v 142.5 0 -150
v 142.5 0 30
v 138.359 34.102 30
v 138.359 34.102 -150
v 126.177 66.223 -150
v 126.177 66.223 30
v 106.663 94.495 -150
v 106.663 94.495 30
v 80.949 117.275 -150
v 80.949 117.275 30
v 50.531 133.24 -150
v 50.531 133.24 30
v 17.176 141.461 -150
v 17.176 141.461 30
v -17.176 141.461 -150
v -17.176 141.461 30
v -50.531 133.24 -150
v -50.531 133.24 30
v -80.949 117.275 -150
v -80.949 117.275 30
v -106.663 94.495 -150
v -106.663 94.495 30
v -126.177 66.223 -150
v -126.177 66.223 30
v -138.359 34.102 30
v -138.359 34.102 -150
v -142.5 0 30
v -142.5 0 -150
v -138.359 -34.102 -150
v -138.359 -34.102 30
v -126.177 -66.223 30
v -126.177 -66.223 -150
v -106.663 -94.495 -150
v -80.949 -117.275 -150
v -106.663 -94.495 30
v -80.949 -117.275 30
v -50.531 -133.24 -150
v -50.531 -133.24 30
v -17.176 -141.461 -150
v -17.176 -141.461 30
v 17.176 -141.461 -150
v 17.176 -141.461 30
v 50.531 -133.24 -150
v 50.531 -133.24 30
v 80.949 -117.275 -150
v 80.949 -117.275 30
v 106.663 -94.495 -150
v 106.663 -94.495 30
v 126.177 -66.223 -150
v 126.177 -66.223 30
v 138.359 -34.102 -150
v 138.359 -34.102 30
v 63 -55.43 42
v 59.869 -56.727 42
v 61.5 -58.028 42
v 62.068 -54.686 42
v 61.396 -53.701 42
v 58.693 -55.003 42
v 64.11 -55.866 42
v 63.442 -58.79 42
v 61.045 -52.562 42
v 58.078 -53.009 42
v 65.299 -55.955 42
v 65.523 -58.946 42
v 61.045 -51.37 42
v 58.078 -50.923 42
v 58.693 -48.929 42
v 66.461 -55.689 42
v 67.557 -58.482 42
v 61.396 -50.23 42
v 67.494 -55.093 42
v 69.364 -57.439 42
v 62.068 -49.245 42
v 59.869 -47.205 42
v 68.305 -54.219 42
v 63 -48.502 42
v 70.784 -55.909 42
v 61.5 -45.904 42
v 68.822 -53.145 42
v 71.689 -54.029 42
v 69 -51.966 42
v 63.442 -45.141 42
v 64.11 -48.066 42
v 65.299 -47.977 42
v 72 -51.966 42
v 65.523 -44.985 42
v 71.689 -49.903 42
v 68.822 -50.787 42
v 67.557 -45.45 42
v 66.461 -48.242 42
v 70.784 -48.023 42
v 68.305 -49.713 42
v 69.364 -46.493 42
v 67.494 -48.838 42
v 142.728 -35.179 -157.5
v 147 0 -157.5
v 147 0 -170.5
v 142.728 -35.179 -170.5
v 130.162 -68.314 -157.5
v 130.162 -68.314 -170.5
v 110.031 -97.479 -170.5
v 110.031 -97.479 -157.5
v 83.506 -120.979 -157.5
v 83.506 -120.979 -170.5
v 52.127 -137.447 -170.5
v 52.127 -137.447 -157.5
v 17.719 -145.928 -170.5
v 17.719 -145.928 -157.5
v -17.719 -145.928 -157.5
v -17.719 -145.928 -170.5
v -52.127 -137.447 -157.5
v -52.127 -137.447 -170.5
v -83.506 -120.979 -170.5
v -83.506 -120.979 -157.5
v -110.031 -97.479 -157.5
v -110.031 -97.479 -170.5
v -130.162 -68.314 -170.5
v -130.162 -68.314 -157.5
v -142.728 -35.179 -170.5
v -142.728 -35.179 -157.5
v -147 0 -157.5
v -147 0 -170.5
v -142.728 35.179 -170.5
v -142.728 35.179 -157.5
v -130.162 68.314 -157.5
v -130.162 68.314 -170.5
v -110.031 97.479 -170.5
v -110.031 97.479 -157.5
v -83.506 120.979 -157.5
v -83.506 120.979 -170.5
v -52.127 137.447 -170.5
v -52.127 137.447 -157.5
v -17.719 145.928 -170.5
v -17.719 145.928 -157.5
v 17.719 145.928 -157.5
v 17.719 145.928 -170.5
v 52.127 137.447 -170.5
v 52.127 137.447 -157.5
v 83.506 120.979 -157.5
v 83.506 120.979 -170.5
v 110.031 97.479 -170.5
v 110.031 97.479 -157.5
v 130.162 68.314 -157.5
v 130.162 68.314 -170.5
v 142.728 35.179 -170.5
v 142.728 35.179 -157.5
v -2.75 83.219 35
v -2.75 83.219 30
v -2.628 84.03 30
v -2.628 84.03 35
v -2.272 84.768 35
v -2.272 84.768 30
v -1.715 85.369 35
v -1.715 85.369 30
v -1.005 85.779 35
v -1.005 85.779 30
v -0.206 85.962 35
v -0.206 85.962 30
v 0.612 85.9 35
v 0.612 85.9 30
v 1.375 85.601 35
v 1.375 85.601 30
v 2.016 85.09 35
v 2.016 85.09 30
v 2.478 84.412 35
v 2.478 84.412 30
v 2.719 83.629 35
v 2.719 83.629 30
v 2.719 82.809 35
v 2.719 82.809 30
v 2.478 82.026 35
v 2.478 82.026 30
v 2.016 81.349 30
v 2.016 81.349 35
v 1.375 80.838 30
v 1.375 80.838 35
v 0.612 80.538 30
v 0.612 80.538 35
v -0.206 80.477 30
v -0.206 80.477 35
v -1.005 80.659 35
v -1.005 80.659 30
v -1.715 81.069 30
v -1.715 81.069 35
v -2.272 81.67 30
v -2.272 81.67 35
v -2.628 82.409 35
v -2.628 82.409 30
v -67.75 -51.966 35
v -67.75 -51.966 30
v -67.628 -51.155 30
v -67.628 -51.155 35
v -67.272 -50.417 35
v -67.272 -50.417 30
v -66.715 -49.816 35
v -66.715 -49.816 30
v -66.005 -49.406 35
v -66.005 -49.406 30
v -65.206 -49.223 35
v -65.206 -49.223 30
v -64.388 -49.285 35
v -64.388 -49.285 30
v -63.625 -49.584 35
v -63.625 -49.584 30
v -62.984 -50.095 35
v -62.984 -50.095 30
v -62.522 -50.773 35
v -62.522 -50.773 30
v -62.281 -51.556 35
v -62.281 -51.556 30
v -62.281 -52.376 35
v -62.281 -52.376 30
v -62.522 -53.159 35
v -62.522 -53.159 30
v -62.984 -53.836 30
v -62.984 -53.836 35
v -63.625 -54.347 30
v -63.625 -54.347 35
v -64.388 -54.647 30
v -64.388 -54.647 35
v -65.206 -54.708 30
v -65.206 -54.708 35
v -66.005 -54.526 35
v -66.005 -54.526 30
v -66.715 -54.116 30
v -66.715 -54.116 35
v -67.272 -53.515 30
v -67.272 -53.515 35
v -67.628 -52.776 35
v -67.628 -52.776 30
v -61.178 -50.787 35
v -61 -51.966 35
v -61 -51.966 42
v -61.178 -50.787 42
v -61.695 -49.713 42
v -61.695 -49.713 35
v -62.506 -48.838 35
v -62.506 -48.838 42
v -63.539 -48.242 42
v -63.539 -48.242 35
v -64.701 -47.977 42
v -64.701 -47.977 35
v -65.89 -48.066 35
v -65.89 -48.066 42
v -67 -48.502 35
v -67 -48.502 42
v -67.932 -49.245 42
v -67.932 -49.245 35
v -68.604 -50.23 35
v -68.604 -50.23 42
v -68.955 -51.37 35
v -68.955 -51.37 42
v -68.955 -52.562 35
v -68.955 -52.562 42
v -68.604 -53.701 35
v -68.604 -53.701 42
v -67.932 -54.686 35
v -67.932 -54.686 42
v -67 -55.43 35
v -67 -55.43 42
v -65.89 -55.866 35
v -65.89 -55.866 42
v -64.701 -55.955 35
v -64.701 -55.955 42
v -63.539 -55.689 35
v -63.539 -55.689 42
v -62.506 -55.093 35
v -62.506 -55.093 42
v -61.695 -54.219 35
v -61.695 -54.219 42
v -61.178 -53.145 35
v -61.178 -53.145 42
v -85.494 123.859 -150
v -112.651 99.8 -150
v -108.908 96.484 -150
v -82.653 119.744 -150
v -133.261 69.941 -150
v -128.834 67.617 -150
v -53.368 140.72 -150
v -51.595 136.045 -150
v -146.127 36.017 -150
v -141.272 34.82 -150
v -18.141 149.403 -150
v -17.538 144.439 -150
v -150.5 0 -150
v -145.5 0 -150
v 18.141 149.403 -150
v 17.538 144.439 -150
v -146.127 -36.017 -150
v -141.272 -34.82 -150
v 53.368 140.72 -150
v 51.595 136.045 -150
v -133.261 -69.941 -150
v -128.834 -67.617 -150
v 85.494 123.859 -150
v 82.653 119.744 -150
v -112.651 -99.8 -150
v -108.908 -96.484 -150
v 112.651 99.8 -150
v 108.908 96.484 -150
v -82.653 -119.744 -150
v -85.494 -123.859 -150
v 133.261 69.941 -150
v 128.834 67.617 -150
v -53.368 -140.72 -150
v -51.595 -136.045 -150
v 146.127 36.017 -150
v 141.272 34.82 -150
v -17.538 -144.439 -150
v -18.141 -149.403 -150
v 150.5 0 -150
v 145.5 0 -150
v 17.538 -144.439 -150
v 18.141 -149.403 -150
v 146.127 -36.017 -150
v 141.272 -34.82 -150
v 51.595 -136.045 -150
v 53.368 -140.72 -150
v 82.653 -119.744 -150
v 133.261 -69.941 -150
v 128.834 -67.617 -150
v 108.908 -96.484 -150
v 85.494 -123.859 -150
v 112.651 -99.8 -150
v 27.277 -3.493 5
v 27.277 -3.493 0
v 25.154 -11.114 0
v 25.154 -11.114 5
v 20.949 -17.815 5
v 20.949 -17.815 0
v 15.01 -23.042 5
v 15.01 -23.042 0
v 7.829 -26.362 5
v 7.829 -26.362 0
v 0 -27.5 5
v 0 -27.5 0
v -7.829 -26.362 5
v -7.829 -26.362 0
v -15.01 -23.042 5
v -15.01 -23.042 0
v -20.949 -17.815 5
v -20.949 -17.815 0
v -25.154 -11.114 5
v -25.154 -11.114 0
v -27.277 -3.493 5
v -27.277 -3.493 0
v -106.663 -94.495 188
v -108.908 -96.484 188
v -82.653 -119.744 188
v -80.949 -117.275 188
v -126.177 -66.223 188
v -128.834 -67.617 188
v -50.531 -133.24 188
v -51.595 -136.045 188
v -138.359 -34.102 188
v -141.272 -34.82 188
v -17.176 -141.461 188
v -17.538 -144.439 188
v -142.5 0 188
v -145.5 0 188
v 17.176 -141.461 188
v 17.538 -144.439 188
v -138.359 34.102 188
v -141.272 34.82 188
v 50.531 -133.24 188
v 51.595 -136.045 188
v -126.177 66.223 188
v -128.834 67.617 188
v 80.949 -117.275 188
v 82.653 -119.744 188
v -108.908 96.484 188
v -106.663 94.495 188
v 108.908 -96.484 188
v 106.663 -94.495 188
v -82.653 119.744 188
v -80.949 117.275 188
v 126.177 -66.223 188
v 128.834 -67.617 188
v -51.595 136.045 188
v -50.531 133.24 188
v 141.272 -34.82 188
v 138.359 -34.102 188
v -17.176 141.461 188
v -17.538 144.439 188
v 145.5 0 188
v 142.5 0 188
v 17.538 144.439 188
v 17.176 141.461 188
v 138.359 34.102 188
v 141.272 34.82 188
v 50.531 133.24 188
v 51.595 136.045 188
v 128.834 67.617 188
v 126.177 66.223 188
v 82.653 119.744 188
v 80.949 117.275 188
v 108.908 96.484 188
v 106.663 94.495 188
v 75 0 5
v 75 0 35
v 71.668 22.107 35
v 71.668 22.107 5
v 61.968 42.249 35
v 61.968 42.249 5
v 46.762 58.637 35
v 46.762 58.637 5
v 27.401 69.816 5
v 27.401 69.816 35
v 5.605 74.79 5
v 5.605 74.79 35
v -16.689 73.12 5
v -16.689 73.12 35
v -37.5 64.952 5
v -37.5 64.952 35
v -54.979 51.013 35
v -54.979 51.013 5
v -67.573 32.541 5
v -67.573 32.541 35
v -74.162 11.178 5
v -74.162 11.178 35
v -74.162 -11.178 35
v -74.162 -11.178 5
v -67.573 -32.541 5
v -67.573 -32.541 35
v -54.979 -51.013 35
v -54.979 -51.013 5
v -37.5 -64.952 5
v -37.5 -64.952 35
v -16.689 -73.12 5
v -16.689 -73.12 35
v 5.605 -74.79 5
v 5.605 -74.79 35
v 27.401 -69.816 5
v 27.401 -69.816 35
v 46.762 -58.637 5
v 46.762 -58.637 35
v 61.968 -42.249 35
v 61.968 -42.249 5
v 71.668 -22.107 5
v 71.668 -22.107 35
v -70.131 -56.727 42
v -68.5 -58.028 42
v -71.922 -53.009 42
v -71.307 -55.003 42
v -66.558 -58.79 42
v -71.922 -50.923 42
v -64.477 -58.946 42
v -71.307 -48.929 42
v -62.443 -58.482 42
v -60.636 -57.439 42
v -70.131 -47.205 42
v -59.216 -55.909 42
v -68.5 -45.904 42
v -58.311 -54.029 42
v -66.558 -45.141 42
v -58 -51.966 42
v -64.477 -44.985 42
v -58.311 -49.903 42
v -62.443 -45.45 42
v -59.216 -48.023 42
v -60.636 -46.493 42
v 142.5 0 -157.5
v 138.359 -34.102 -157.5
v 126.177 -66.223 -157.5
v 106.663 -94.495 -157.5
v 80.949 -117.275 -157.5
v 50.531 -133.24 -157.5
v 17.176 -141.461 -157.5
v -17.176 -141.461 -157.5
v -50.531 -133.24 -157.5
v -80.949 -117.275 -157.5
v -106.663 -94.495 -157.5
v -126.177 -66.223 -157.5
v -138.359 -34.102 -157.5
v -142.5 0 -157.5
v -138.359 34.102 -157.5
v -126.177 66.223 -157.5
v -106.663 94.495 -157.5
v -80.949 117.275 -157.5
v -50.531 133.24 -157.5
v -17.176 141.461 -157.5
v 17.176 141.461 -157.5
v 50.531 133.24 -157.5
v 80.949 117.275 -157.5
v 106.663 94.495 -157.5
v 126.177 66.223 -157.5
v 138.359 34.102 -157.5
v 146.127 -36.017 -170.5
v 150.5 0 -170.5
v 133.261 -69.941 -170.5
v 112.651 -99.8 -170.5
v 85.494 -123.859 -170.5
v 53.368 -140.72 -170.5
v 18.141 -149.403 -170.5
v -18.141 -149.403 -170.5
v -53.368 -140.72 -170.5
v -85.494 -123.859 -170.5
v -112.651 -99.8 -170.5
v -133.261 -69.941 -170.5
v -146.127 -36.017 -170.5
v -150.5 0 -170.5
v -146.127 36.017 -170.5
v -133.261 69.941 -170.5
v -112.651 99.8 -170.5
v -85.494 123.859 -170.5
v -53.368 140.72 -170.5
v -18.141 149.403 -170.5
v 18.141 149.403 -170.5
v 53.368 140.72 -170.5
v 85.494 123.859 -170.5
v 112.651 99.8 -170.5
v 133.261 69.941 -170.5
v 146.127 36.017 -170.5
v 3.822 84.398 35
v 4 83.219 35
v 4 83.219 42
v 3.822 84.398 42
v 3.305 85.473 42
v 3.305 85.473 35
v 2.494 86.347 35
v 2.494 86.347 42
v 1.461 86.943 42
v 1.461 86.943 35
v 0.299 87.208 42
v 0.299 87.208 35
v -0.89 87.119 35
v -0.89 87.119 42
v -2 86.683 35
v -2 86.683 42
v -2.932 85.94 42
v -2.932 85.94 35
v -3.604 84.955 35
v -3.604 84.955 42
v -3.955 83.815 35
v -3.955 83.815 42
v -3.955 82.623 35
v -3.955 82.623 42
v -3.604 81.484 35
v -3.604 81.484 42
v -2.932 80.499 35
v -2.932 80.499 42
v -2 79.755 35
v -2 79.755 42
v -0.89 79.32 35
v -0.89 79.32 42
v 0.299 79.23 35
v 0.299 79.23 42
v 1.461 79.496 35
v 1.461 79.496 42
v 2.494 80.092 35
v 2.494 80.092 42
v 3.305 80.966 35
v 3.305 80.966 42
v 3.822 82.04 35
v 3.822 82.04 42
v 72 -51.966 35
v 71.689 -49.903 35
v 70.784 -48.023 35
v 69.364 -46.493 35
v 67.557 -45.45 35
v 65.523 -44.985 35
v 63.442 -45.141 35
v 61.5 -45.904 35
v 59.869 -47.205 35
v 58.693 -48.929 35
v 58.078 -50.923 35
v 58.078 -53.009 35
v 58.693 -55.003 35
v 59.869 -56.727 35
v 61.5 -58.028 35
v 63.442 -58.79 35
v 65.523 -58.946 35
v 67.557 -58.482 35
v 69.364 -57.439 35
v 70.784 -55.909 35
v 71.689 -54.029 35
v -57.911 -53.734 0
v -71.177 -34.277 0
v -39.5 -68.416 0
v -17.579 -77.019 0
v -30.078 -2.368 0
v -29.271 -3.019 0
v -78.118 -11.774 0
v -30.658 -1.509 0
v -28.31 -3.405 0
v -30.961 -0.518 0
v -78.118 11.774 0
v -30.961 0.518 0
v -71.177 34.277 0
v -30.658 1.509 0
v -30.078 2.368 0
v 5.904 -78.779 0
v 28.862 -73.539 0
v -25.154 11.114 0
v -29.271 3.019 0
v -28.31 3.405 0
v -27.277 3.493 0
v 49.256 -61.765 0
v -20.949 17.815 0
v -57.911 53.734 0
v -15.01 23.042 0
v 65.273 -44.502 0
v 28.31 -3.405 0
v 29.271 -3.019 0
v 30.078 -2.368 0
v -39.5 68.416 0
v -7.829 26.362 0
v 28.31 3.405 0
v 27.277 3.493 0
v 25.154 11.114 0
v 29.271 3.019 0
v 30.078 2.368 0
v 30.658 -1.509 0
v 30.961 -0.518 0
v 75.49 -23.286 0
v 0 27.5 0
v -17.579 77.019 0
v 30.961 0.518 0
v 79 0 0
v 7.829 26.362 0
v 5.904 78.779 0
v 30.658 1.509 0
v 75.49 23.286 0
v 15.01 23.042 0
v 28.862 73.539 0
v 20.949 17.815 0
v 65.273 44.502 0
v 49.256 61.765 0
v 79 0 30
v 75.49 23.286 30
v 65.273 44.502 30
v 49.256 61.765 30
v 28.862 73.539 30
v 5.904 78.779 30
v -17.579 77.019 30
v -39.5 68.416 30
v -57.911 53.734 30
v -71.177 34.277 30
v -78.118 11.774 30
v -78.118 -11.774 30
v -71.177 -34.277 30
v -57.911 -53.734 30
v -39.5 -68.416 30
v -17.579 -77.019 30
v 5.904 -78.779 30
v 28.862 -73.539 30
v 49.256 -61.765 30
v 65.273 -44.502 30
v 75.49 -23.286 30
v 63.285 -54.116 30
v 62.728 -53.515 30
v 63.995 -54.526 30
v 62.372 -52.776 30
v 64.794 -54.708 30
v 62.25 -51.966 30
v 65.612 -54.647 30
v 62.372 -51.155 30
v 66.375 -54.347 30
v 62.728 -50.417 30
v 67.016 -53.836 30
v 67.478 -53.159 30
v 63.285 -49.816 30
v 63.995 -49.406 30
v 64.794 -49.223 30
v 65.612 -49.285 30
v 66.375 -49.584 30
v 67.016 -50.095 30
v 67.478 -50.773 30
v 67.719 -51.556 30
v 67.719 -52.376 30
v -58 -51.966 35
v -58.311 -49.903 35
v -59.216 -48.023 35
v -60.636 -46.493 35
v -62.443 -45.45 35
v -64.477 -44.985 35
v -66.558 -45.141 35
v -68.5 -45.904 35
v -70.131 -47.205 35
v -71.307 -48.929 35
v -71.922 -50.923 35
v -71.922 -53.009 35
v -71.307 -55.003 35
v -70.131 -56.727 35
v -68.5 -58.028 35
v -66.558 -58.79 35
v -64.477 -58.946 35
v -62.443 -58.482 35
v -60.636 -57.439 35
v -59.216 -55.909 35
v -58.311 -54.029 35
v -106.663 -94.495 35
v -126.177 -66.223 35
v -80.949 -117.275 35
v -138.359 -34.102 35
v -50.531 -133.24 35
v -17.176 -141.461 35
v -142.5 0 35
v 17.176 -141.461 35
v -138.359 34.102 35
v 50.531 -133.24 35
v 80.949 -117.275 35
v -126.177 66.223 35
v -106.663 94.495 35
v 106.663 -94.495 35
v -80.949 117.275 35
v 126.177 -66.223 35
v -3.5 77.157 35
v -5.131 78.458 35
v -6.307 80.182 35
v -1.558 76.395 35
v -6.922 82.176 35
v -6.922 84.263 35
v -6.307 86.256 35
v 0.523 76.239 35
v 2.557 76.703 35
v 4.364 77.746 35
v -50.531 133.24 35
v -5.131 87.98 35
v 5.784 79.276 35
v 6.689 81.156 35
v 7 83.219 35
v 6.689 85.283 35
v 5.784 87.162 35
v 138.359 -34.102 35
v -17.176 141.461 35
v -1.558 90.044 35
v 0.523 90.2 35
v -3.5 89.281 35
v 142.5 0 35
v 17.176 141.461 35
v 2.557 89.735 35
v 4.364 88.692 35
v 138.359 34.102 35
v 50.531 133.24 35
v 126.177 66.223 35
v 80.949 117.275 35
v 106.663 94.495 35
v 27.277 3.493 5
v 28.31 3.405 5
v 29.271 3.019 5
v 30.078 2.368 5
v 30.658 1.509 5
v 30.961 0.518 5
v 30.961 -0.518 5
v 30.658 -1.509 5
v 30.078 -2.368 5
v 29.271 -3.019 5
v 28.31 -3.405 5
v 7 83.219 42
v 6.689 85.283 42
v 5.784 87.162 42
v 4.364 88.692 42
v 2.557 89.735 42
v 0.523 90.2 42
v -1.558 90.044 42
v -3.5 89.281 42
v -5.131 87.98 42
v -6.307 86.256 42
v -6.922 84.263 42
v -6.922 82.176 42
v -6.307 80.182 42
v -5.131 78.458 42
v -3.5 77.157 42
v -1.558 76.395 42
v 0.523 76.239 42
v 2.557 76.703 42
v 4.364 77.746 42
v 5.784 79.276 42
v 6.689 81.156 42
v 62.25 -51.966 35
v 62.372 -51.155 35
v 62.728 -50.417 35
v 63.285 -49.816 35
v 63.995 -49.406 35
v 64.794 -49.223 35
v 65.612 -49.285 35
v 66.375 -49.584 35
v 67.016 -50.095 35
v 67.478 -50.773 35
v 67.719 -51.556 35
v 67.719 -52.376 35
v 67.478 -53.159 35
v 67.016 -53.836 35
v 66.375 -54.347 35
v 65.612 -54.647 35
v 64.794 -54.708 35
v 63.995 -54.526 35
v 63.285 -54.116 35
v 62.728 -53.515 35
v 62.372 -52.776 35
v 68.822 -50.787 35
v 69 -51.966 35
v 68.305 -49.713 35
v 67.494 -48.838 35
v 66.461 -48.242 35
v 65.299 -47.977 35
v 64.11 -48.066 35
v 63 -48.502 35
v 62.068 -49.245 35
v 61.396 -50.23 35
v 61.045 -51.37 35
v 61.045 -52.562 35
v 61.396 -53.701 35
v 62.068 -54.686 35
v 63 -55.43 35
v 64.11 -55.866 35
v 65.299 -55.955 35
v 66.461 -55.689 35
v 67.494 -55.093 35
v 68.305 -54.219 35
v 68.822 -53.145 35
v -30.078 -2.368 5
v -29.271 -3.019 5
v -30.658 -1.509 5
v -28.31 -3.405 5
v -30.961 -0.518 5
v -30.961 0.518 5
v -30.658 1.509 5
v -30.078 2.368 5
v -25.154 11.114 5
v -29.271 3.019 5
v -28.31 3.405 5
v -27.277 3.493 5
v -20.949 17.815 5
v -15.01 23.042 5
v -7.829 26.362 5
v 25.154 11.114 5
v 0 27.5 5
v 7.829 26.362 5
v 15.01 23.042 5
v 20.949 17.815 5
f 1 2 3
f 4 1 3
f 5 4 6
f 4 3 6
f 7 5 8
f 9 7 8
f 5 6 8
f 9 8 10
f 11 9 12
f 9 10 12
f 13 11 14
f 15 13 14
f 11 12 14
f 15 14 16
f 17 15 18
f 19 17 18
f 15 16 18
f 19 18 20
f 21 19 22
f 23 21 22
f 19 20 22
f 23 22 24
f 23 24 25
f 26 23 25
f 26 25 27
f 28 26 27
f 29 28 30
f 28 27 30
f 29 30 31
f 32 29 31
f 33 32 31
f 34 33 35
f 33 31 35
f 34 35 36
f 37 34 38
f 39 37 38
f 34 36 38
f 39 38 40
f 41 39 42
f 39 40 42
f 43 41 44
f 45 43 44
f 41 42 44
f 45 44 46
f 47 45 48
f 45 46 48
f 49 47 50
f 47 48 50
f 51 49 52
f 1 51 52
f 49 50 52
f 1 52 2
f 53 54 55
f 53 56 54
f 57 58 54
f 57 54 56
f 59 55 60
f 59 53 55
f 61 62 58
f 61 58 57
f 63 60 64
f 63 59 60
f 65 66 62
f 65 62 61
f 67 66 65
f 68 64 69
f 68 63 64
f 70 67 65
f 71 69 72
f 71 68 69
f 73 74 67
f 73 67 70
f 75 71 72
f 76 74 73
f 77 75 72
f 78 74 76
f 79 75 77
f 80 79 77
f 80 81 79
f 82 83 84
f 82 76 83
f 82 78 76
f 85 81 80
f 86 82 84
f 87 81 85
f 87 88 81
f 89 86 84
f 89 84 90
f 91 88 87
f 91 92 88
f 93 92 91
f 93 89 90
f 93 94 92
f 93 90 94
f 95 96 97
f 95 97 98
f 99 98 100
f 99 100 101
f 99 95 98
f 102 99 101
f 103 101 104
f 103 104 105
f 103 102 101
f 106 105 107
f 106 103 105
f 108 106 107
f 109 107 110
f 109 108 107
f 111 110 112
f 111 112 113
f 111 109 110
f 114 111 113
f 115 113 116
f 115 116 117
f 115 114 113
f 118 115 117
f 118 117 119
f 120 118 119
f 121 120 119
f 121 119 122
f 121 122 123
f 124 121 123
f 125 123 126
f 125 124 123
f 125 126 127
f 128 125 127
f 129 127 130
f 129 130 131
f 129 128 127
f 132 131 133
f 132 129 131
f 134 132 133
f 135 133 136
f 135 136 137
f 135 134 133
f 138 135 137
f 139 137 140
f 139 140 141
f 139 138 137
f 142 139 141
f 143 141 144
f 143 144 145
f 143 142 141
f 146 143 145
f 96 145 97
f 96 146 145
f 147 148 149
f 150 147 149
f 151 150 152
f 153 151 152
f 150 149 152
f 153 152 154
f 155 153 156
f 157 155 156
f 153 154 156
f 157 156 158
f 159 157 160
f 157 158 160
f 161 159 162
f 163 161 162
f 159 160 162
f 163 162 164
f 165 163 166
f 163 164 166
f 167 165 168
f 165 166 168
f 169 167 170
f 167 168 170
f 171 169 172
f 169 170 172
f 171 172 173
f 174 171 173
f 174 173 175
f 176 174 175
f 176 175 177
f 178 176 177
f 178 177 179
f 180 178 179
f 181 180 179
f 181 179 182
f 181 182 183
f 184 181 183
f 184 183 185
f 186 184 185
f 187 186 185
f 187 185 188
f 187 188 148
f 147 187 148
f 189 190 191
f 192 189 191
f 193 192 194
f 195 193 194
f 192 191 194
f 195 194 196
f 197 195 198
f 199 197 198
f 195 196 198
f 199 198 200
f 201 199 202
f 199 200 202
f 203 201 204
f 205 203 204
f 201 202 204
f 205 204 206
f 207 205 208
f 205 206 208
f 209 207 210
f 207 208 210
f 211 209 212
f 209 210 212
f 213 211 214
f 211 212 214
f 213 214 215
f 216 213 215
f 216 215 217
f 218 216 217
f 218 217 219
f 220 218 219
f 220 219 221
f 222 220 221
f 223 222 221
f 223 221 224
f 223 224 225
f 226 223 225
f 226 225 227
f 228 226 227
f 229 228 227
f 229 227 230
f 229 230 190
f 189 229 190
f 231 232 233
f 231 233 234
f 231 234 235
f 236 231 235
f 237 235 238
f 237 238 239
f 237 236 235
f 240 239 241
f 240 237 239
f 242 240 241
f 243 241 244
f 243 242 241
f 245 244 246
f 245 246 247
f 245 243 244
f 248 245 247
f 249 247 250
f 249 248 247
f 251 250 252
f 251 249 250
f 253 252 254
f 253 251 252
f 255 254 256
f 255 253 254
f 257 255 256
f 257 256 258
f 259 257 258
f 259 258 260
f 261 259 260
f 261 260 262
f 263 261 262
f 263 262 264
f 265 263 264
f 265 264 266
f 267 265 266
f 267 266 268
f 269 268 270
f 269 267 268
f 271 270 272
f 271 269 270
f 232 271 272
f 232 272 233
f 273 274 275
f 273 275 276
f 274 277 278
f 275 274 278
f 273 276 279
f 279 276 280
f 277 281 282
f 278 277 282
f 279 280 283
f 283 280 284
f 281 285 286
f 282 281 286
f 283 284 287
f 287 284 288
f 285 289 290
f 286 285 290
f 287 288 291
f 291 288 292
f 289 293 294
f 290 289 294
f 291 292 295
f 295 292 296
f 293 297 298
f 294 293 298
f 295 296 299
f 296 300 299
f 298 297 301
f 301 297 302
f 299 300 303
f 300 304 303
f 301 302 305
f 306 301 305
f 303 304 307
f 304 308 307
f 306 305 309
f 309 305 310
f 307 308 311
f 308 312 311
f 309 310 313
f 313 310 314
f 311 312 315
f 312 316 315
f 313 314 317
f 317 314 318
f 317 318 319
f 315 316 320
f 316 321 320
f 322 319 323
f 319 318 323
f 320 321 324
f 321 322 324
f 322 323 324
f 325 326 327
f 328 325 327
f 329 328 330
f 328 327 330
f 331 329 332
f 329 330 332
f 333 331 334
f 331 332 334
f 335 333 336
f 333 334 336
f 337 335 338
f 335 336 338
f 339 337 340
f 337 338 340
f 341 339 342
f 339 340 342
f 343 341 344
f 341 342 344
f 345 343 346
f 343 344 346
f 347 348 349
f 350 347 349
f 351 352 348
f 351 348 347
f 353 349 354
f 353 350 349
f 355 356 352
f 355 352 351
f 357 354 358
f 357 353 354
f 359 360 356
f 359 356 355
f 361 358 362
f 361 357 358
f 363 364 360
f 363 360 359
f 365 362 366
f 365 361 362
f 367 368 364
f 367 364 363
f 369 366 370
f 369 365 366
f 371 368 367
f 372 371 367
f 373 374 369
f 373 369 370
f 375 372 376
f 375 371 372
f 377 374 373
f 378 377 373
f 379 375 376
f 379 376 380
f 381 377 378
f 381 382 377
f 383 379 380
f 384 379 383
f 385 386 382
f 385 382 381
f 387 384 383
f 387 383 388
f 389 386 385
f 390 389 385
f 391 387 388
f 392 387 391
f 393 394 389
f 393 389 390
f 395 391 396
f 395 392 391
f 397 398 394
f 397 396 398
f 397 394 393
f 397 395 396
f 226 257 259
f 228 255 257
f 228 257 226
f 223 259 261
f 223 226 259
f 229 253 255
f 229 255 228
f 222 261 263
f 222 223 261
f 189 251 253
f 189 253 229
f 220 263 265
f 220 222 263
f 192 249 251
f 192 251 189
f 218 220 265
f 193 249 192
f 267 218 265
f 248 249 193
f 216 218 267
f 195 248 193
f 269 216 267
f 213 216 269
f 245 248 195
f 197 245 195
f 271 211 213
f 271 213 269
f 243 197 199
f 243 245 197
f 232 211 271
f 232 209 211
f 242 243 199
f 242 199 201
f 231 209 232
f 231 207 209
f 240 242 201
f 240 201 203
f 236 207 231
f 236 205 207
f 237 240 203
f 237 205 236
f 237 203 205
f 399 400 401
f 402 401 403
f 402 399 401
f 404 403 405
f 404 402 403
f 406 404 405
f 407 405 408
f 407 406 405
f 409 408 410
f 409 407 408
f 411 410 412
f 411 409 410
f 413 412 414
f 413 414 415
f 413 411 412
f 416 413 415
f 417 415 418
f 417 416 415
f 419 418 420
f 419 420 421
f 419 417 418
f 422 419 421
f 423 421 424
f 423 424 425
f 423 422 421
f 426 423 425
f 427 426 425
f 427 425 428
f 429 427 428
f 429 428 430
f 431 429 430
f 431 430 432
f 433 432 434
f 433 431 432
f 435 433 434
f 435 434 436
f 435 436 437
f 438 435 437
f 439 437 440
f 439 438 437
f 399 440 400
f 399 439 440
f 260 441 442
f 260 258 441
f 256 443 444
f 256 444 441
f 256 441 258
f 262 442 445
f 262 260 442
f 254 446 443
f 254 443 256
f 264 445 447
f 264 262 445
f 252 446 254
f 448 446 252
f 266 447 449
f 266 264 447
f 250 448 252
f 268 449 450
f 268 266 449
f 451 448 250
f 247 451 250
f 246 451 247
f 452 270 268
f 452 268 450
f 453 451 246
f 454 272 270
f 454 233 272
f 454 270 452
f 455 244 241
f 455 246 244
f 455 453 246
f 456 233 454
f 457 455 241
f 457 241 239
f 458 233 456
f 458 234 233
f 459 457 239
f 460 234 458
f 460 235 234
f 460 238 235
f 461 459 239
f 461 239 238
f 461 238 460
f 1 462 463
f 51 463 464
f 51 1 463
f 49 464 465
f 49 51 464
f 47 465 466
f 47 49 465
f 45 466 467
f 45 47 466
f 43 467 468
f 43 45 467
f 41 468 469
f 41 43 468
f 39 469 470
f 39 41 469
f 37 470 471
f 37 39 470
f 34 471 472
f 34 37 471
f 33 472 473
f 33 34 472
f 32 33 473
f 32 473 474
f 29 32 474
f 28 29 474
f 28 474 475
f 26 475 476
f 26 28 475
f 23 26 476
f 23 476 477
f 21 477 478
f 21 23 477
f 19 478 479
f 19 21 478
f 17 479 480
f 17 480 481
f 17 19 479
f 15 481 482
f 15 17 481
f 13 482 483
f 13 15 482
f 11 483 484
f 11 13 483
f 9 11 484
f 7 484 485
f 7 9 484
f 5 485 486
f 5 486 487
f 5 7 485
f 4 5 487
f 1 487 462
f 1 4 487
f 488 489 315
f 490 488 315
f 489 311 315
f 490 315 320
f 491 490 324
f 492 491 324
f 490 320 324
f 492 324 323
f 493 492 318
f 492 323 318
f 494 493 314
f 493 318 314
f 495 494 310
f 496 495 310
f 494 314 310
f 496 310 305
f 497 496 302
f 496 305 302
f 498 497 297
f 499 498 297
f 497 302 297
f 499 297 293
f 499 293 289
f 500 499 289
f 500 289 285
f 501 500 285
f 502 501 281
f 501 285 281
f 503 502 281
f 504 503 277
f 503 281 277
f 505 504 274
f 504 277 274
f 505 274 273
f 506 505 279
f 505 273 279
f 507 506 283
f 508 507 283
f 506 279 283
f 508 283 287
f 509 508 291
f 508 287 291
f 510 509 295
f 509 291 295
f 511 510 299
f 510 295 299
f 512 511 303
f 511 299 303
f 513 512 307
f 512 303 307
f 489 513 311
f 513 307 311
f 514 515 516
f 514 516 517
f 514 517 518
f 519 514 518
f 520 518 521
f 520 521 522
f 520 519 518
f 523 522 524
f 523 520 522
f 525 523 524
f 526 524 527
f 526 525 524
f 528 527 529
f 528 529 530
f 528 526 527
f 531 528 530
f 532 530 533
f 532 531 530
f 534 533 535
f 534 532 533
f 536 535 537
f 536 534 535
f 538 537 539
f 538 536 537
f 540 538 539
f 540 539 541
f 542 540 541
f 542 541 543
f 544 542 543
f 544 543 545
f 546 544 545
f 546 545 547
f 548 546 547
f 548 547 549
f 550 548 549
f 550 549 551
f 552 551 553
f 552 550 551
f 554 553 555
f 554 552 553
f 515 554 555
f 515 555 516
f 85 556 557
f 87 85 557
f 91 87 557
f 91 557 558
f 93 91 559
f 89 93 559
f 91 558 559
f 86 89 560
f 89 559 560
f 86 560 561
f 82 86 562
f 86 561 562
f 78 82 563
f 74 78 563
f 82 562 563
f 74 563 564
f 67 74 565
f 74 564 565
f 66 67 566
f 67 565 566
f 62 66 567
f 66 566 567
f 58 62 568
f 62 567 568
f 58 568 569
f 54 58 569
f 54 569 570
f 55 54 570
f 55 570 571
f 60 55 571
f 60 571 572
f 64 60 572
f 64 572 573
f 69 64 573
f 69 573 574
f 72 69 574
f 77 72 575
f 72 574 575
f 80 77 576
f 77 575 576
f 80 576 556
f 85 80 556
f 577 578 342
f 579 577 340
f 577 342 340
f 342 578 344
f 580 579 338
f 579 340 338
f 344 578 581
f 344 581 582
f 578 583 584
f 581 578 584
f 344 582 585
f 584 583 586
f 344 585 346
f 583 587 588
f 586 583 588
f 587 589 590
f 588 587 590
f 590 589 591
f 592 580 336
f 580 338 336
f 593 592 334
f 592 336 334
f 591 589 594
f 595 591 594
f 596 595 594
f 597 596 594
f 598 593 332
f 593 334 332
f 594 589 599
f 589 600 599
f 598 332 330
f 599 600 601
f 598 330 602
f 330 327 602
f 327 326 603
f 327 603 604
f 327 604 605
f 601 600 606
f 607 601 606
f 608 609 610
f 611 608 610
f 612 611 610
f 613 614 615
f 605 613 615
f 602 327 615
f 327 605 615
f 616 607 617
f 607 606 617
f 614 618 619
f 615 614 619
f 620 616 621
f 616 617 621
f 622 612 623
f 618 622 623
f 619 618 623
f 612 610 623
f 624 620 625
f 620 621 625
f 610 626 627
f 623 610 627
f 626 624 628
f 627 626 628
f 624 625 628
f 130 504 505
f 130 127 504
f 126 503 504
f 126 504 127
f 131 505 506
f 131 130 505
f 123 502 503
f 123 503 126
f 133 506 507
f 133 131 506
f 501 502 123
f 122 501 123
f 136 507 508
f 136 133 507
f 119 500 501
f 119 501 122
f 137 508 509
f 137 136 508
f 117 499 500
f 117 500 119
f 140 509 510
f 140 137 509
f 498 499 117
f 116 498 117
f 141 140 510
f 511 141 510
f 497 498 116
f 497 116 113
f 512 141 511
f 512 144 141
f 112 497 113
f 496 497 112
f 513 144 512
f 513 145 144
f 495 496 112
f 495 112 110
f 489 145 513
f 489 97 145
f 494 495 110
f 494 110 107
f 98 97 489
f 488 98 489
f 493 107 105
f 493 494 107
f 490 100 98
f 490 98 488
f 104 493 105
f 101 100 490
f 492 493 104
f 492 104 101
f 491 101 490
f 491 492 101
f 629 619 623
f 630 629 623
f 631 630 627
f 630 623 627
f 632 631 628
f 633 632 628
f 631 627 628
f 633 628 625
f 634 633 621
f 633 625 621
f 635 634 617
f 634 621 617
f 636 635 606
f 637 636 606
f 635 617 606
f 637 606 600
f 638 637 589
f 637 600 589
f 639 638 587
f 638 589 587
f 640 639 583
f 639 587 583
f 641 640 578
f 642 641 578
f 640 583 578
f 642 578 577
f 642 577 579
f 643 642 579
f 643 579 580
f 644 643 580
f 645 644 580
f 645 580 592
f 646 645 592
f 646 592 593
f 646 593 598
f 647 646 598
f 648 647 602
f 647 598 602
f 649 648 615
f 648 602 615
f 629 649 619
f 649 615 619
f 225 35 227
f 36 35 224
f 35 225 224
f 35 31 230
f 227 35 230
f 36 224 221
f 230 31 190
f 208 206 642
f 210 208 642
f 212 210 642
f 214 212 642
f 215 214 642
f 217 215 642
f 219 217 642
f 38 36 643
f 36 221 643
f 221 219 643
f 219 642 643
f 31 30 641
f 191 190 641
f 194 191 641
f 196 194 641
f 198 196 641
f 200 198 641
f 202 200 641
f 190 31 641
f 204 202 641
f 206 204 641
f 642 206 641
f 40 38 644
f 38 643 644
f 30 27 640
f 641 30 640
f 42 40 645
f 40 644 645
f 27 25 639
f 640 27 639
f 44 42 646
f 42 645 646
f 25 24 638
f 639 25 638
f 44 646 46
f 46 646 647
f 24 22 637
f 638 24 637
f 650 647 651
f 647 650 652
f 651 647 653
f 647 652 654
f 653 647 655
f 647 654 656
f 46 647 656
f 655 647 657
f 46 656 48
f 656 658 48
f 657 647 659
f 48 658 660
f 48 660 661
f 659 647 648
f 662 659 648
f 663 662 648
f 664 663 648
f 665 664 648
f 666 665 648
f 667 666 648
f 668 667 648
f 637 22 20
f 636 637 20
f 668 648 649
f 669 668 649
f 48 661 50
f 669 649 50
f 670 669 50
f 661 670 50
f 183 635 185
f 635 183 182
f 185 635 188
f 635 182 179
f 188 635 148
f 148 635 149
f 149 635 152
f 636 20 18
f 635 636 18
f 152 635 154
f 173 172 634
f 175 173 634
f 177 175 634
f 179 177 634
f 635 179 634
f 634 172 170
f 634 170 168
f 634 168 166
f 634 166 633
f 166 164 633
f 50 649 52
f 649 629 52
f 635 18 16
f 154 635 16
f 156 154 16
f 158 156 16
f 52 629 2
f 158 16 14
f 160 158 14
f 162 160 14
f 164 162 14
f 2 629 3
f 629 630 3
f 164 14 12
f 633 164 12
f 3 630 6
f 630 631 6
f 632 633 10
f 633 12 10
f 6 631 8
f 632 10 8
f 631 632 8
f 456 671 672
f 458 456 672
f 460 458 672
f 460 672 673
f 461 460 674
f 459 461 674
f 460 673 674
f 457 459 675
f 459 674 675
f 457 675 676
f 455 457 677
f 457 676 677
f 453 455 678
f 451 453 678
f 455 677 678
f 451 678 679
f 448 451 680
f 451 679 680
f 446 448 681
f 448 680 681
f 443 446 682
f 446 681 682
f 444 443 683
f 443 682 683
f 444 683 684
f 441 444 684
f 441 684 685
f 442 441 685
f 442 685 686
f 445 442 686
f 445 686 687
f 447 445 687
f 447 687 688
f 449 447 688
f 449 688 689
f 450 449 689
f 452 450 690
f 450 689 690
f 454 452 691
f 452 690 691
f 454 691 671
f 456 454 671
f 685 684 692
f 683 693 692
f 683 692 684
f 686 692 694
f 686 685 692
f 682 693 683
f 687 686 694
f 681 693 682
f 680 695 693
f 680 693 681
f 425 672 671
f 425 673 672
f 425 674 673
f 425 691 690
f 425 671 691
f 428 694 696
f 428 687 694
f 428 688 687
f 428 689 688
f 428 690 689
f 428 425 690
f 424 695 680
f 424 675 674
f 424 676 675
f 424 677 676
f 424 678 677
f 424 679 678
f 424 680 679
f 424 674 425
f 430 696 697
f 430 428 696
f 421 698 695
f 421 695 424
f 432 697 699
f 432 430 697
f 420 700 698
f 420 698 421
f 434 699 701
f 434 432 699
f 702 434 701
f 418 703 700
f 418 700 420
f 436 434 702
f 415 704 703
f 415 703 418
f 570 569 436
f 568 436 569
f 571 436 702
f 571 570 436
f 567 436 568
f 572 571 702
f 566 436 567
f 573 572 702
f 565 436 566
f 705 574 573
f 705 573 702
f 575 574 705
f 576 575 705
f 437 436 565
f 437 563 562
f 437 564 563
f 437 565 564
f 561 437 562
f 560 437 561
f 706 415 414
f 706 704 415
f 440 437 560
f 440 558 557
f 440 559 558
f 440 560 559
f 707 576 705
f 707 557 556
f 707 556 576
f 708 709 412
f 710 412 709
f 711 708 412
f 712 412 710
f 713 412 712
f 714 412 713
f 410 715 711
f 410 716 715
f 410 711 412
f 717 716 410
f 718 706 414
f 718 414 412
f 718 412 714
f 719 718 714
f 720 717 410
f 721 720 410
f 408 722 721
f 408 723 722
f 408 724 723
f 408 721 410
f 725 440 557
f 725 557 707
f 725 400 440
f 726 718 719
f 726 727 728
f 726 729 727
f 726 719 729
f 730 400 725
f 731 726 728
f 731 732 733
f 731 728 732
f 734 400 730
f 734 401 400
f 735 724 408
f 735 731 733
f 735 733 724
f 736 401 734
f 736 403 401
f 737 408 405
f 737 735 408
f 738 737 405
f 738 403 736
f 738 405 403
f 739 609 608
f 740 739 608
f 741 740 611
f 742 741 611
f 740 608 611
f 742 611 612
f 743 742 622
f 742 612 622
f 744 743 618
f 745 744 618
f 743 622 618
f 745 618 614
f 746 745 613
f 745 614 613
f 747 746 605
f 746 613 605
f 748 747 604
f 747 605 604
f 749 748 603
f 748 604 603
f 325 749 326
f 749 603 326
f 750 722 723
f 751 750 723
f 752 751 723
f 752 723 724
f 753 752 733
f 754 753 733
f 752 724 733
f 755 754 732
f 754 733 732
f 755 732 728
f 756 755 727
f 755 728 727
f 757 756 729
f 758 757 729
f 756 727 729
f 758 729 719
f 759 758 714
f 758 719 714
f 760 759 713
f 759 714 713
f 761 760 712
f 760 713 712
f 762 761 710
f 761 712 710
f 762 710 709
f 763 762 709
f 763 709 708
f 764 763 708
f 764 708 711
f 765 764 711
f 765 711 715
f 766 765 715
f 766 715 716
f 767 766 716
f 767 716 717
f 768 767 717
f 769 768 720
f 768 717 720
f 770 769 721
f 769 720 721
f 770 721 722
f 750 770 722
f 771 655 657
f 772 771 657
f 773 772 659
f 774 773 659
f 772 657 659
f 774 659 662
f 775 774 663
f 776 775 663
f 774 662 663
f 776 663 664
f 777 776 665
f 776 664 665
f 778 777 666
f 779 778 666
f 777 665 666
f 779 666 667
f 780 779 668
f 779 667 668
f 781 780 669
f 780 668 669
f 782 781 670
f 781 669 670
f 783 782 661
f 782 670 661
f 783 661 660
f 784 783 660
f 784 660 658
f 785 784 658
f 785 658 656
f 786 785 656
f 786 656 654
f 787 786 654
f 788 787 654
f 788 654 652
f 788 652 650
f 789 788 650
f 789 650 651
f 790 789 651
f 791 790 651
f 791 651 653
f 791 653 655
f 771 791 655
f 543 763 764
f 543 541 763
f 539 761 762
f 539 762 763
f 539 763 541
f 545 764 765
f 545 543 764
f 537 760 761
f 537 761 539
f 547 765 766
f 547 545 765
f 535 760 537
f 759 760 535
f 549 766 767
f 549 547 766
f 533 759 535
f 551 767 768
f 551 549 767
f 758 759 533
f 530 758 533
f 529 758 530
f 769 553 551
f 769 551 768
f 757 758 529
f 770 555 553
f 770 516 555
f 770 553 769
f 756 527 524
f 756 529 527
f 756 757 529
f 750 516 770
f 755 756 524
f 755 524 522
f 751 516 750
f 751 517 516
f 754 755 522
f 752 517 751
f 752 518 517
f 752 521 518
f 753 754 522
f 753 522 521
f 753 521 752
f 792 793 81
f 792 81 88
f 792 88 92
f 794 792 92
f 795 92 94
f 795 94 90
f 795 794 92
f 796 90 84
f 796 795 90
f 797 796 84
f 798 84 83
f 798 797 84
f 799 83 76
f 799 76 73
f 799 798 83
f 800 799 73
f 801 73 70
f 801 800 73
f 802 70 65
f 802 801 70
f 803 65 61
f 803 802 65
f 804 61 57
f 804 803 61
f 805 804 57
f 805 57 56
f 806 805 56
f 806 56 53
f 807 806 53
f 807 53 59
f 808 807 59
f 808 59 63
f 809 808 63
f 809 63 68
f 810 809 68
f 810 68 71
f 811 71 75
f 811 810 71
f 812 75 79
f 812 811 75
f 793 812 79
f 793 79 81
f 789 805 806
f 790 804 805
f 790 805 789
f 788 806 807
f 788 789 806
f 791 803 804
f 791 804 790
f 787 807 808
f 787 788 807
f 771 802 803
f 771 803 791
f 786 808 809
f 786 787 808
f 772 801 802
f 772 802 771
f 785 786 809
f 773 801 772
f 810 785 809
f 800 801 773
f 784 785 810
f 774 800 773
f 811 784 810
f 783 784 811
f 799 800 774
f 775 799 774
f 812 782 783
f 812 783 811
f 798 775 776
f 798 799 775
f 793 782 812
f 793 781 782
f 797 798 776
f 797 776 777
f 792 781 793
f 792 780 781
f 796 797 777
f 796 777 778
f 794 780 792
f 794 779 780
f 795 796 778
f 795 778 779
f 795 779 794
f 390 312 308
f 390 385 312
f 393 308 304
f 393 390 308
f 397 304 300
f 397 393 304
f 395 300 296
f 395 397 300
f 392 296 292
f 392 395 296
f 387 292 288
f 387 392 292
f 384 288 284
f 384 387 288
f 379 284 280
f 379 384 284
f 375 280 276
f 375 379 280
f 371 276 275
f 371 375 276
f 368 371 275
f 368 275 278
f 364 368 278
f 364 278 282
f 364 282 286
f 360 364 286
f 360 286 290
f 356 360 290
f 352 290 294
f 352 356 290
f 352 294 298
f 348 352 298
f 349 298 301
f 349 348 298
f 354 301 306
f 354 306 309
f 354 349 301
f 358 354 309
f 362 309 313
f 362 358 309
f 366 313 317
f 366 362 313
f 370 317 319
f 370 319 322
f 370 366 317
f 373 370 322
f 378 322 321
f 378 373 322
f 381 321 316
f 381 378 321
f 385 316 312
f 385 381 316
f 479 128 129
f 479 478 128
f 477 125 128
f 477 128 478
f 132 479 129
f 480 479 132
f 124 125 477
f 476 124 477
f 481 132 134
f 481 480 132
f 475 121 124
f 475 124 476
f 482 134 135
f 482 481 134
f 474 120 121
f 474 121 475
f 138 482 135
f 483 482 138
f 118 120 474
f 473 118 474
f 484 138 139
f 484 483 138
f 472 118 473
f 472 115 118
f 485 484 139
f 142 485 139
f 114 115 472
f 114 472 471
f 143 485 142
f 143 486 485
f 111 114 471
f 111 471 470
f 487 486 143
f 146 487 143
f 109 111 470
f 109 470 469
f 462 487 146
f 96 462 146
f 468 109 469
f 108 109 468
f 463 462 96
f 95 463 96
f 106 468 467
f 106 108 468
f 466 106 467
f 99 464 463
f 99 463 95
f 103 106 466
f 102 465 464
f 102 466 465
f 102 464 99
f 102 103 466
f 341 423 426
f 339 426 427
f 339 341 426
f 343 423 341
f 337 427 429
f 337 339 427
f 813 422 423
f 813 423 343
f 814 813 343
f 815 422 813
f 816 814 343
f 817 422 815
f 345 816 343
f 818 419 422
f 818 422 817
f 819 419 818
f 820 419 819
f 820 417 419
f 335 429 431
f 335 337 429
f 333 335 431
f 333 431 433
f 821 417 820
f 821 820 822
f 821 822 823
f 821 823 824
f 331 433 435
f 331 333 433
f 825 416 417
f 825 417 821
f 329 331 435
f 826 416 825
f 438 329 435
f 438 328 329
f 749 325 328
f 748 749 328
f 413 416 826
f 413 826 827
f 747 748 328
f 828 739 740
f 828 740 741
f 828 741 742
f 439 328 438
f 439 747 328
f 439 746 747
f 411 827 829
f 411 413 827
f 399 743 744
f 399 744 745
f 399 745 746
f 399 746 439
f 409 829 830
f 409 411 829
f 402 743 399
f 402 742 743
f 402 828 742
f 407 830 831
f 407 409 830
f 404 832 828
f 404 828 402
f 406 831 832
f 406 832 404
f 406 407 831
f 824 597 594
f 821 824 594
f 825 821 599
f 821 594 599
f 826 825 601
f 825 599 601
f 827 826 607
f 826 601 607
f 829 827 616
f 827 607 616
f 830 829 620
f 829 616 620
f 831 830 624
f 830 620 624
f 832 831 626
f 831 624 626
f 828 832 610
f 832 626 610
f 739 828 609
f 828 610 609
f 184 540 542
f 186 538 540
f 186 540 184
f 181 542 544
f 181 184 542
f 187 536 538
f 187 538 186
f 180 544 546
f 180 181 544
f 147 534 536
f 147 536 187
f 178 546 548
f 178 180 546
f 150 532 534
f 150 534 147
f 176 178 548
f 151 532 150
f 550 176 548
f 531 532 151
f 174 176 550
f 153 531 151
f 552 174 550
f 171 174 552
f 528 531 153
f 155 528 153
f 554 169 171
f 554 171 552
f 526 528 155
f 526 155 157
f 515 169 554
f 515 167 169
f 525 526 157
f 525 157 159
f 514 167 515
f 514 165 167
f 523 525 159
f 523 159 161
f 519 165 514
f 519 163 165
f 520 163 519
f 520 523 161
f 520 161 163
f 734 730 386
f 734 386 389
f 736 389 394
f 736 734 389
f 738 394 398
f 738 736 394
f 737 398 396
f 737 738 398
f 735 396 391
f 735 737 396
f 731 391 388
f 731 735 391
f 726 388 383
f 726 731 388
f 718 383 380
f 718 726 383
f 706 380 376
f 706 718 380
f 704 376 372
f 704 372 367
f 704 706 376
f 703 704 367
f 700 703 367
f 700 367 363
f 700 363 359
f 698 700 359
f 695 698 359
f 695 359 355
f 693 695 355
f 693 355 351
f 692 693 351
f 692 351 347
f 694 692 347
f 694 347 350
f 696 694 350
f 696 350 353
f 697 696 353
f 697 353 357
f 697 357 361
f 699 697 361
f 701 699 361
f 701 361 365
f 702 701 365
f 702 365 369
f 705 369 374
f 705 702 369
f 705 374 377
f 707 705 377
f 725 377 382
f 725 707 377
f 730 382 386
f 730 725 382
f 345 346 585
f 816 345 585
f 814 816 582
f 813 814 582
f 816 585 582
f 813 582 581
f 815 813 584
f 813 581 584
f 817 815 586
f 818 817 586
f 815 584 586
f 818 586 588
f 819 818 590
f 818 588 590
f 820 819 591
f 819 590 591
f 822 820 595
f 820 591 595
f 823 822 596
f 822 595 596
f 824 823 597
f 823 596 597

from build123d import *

# Parameters (mm, degrees)
F0_R      = 75
F1_DEPTH  = 5
F0_R_2    = 79
F2_DEPTH  = 30
F3_R      = 142.5
F3_R_2    = 79
F3_R_3    = 75
F4_DEPTH  = 5
F3_R_4    = 145.5
F5_DEPTH  = 158
F6_DEPTH  = 180
F7_R      = 150.5
F7_R_2    = 145.5
F7_R_3    = 142.5
F8_DEPTH  = 7.5
F9_R      = 150.5
F9_R_2    = 147
F10_DEPTH = 13
F11_R     = 7
F11_R_2   = 4
F12_DEPTH = 7
F13_D     = 5.5
F13_DEPTH = 12
F13_TIP   = 1.6523667023


with BuildPart() as f1:
    # F0 (on Top) → F1 (new body)
    with BuildSketch(Plane.XY):
        Circle(F0_R)
        with BuildLine():
            ThreePointArc((-27.2772727273, 3.4929060339), (0, 27.5), (27.2772727273, 3.4929060339))
            ThreePointArc((27.2772727273, 3.4929060339), (31, 0), (27.2772727273, -3.4929060339))
            ThreePointArc((27.2772727273, -3.4929060339), (0, -27.5), (-27.2772727273, -3.4929060339))
            ThreePointArc((-27.2772727273, -3.4929060339), (-31, 0), (-27.2772727273, 3.4929060339))
        make_face(mode=Mode.SUBTRACT)
    extrude(amount=F1_DEPTH)

    # F0 (on Top) → F2 (join)
    with BuildSketch(Plane.XY):
        Circle(F0_R_2)
        Circle(F0_R, mode=Mode.SUBTRACT)
    extrude(amount=F2_DEPTH)

    # F3 (on face) → F4 (join)
    with BuildSketch(Plane.XY.offset(30)):
        Circle(F3_R)
        Circle(F3_R_2, mode=Mode.SUBTRACT)
        Circle(F3_R_2)
        Circle(F3_R_3, mode=Mode.SUBTRACT)
    extrude(amount=F4_DEPTH)

    # F3 (on face) → F5 (join)
    with BuildSketch(Plane.XY.offset(30)):
        Circle(F3_R_4)
        Circle(F3_R, mode=Mode.SUBTRACT)
    extrude(amount=F5_DEPTH)

    # F3 (on face) → F6 (join)
    with BuildSketch(Plane.XY.offset(30)):
        Circle(F3_R_4)
        Circle(F3_R, mode=Mode.SUBTRACT)
    extrude(amount=-F6_DEPTH)

    # F7 (on face) → F8 (join)
    with BuildSketch(Plane(origin=(0, 0, -150), x_dir=(1, 0, 0), z_dir=(0, 0, -1))):
        Circle(F7_R)
        Circle(F7_R_2, mode=Mode.SUBTRACT)
        Circle(F7_R_2)
        Circle(F7_R_3, mode=Mode.SUBTRACT)
    extrude(amount=F8_DEPTH)

    # F9 (on face) → F10 (join)
    with BuildSketch(Plane(origin=(0, 0, -157.5), x_dir=(1, 0, 0), z_dir=(0, 0, -1))):
        Circle(F9_R)
        Circle(F9_R_2, mode=Mode.SUBTRACT)
    extrude(amount=F10_DEPTH)

    # F11 (on face) → F12 (join)
    with BuildSketch(Plane.XY.offset(35)):
        with Locations((0, 83.2192561637)):
            Circle(F11_R)
        with Locations((0, 83.2192561637)):
            Circle(F11_R_2, mode=Mode.SUBTRACT)
        with Locations((-65, -51.9658021822)):
            Circle(F11_R)
        with Locations((-65, -51.9658021822)):
            Circle(F11_R_2, mode=Mode.SUBTRACT)
        with Locations((65, -51.9658021822)):
            Circle(F11_R)
        with Locations((65, -51.9658021822)):
            Circle(F11_R_2, mode=Mode.SUBTRACT)
    extrude(amount=F12_DEPTH)

    # F13
    with Locations(Plane.XY.offset(35)):
        with Locations((0, 83.2192561637), (-65, -51.9658021822), (65, -51.9658021822)):
            Hole(F13_D / 2, depth=F13_DEPTH)
            with Locations((0, 0, -(F13_DEPTH + F13_TIP / 2))):  # 118° drill point
                Cone(0, F13_D / 2, F13_TIP, mode=Mode.SUBTRACT)


solid = f1.part
